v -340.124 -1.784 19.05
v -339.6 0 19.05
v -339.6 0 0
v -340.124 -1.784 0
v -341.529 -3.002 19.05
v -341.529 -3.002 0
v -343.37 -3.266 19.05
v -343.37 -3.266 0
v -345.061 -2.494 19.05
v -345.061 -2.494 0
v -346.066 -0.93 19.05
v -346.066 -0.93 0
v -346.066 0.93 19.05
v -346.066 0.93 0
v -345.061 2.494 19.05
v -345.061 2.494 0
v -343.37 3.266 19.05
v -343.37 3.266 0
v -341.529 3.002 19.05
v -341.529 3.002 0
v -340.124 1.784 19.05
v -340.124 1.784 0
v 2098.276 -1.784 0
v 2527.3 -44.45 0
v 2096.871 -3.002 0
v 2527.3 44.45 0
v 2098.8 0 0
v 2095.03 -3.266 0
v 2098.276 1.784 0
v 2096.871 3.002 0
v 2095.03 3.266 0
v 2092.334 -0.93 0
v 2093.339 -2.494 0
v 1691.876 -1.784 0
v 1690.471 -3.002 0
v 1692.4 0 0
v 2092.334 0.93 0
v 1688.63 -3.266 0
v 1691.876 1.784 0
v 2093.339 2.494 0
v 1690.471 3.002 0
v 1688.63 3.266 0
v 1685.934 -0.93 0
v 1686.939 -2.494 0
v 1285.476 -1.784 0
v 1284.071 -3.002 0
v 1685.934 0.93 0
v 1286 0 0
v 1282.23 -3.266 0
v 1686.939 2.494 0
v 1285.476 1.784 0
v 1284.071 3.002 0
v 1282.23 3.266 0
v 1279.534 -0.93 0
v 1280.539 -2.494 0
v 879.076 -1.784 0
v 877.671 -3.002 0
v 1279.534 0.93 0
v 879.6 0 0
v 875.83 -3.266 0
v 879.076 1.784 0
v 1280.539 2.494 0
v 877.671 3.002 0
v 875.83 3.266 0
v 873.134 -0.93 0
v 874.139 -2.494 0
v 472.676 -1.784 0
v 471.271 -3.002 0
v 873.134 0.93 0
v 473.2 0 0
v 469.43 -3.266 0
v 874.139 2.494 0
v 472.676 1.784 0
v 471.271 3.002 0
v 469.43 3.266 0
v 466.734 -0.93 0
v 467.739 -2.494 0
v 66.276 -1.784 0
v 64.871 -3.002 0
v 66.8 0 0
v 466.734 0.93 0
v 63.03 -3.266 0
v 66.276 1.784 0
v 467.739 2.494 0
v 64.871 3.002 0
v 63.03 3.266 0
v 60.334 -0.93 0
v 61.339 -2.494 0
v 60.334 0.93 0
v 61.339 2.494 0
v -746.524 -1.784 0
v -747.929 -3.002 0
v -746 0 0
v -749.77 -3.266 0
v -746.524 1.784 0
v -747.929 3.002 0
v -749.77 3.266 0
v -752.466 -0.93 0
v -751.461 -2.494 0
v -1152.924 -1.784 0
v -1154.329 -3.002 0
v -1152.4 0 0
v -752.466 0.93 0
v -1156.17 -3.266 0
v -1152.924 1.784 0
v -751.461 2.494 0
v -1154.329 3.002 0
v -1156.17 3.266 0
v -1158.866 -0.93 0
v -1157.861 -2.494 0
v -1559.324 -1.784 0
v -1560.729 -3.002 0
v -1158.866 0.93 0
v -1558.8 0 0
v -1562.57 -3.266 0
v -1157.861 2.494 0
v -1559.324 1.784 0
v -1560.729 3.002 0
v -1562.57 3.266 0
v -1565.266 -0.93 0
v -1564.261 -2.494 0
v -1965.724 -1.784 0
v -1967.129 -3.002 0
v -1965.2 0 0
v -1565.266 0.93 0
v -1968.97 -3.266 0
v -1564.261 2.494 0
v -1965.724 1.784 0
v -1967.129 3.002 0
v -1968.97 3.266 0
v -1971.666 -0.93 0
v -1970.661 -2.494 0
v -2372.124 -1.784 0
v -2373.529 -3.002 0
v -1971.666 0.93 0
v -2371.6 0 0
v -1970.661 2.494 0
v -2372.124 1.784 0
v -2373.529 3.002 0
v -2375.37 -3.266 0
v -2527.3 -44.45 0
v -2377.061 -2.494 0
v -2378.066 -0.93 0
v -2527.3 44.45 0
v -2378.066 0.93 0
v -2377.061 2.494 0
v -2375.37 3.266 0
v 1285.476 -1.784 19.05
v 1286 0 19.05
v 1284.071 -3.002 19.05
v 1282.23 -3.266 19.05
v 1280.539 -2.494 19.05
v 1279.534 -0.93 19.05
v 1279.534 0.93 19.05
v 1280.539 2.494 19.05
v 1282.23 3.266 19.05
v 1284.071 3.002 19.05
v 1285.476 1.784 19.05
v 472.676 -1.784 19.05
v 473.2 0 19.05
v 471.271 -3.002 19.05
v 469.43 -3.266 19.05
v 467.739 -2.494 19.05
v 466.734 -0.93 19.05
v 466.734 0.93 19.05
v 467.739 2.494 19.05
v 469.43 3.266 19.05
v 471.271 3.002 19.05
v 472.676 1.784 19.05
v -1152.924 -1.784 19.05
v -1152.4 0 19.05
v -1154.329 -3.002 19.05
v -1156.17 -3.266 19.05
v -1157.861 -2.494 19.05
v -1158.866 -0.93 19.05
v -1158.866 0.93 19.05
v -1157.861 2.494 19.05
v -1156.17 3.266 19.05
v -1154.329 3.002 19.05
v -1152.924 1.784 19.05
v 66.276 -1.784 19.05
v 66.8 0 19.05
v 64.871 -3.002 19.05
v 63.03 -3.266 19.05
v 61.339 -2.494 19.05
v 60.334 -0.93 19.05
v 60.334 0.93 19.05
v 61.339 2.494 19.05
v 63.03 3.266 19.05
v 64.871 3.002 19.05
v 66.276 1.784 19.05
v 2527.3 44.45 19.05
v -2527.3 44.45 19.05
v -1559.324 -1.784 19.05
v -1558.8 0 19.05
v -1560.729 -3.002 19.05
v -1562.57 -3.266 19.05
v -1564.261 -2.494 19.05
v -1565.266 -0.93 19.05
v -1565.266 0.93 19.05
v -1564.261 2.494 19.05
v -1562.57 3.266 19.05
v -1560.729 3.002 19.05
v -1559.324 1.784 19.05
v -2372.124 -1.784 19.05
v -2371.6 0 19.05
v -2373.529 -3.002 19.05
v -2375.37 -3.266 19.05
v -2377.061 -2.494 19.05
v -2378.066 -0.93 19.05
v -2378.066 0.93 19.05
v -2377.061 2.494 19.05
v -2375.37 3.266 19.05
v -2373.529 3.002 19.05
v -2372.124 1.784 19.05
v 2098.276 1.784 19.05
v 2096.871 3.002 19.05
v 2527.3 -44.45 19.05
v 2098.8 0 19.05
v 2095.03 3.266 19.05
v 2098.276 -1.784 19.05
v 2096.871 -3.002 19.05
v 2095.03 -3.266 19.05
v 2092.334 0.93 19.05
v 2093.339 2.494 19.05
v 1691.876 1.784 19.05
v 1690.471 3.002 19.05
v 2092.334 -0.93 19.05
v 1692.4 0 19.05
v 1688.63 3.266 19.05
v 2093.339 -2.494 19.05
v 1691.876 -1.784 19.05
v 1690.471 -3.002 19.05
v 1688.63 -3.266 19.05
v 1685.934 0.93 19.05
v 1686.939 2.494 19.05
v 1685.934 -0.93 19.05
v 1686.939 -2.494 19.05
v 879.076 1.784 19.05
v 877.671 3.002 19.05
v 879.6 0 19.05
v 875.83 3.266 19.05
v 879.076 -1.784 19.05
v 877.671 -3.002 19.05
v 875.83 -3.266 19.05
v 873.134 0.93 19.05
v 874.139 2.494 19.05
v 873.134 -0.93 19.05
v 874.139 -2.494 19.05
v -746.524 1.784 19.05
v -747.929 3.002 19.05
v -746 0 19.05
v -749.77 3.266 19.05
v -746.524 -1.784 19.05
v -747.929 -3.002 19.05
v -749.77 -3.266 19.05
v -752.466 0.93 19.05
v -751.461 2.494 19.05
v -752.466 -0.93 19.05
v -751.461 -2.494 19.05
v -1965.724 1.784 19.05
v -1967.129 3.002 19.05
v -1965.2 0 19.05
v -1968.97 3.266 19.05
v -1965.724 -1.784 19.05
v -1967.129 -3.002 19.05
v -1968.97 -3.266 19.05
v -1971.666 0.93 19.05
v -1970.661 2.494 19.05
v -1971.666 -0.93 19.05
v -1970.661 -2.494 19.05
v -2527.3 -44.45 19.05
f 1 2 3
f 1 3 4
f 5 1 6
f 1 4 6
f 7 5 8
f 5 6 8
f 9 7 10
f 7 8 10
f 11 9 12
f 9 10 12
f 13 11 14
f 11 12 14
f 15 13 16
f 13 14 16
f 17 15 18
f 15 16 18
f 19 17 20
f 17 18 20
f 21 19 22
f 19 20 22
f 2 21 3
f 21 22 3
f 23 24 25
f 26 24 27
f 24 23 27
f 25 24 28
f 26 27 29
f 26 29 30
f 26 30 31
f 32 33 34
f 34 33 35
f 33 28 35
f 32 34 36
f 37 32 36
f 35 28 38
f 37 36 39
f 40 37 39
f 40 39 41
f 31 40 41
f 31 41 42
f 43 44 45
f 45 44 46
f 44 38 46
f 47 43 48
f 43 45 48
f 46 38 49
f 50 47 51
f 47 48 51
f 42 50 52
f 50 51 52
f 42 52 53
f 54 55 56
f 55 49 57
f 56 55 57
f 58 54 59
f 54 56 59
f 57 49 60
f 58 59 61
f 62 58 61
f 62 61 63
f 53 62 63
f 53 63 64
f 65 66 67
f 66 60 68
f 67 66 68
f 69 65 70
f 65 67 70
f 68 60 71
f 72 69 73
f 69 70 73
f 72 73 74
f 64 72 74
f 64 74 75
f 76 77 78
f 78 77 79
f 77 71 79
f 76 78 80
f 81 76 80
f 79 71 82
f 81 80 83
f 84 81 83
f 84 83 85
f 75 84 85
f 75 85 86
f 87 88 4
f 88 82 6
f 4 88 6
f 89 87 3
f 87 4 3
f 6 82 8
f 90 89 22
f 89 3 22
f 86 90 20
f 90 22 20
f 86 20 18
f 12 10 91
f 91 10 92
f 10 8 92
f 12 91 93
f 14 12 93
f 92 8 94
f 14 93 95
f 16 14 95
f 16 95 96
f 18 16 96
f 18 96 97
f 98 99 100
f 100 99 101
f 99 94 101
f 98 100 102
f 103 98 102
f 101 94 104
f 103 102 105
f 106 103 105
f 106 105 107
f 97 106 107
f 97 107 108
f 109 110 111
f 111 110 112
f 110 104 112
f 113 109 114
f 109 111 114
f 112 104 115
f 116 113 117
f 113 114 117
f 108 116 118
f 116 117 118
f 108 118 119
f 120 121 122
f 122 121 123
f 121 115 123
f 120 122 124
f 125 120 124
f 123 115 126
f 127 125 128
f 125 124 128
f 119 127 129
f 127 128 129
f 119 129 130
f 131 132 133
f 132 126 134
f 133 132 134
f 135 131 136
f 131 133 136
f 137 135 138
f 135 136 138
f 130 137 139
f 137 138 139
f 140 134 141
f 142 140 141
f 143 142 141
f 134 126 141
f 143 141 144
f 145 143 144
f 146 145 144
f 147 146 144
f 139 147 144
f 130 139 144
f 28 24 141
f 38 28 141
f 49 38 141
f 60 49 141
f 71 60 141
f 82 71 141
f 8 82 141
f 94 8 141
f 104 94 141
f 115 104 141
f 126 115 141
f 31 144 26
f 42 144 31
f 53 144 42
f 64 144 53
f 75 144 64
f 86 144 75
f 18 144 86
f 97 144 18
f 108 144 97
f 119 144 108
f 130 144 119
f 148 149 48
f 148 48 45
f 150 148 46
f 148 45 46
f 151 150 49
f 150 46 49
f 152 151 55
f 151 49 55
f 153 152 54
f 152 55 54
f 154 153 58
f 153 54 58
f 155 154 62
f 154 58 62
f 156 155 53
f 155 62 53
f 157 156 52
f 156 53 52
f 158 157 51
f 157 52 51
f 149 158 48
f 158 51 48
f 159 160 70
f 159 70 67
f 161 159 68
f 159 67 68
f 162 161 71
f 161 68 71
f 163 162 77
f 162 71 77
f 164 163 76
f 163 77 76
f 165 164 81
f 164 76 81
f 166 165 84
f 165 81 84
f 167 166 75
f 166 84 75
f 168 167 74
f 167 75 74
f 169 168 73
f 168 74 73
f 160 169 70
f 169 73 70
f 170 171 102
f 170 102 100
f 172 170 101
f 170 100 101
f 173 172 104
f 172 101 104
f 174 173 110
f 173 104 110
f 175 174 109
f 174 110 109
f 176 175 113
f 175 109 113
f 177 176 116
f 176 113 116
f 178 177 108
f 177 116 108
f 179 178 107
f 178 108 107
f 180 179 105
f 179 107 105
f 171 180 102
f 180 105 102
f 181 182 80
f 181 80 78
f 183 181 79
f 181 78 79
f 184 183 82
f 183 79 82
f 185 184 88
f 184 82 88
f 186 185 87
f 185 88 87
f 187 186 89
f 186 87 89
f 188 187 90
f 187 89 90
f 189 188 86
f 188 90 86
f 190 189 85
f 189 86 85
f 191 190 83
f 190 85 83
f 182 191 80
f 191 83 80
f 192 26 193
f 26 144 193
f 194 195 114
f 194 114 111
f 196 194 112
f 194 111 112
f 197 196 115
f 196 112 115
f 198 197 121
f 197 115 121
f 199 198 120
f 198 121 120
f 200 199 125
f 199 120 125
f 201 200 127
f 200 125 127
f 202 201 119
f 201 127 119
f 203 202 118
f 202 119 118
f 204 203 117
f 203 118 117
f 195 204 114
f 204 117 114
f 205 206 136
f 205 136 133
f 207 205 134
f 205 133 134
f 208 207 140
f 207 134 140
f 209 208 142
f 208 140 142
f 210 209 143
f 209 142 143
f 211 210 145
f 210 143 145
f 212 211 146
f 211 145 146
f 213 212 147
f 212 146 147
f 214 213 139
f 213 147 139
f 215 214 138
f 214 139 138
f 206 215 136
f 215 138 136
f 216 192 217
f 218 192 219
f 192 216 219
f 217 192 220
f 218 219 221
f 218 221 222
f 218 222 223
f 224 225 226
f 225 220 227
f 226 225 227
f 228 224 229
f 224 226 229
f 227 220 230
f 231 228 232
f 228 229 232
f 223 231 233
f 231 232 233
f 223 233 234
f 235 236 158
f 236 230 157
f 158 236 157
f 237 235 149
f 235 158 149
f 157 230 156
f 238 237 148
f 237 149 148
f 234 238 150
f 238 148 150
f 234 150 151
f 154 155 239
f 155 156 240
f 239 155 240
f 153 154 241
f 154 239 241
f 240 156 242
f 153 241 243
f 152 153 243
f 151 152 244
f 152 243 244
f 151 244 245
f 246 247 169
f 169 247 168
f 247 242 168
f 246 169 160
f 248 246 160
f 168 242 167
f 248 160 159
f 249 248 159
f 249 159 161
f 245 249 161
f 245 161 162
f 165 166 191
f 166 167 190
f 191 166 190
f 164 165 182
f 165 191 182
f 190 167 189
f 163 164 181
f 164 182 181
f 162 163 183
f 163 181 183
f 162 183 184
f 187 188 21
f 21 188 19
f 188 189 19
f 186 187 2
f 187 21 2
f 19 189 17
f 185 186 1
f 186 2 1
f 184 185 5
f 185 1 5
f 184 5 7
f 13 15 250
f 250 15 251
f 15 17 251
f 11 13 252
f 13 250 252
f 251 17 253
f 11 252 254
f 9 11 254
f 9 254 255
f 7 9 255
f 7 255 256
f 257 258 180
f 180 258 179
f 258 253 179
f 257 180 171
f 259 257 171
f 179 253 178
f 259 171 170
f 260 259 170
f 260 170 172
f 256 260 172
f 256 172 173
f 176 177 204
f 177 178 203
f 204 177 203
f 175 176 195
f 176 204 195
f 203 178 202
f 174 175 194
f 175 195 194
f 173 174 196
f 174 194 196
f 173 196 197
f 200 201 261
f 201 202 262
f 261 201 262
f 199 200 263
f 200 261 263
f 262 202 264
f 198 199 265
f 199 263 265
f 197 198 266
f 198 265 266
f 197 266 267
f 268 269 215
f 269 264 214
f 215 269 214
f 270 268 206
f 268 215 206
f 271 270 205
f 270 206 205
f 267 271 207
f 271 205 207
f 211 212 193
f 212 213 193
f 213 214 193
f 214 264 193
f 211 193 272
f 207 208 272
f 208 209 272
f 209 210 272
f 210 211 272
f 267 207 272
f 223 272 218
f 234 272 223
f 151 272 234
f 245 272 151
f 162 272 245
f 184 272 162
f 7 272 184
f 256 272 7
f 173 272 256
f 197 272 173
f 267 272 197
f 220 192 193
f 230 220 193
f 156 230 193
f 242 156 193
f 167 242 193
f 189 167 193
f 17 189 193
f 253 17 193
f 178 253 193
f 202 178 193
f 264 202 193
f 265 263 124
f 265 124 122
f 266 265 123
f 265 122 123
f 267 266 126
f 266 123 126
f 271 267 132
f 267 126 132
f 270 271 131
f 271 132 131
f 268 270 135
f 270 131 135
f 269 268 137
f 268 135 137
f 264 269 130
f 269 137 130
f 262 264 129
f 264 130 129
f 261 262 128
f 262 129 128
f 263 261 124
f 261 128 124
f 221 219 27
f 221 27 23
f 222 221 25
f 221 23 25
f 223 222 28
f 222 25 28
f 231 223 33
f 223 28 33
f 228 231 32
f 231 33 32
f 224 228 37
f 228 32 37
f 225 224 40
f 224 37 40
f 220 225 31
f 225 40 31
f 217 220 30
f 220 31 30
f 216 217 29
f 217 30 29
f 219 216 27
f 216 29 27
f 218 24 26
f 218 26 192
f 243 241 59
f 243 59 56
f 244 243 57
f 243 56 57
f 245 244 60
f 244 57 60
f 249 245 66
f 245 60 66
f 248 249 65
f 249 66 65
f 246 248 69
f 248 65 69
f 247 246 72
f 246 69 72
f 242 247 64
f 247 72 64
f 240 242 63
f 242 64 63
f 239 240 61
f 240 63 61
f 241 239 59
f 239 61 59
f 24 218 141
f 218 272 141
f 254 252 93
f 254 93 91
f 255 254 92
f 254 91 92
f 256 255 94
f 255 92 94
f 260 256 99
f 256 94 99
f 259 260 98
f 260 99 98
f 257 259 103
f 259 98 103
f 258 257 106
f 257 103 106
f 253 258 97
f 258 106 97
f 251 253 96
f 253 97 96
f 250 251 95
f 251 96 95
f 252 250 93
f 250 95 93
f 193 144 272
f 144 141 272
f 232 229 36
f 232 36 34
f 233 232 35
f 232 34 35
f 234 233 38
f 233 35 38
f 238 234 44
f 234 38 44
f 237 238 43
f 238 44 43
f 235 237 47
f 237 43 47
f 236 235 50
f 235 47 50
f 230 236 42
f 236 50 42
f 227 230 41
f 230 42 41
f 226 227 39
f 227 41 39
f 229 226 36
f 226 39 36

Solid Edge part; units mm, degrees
sketch "Sketch1" plane through (0, 0, 0) normal (1, 0, 0) x (0, 1, 0)
  line L0 (-44.45, 0) -> (44.45, 0)
  line L1 (44.45, 0) -> (44.45, 19.05)
  line L2 (44.45, 19.05) -> (-44.45, 19.05)
  line L3 (-44.45, 19.05) -> (-44.45, 0)
  dimension "D1" = 88.9
  dimension "D2" = 19.05
extrude "Protrusion1" add sketch "Sketch1" along normal mid plane 5054.6
sketch "Sketch2" plane through (0, 0, 0) normal (0, 0, -1) x (1, 0, 0)
  circle A0 centre (-2374.9, 0) radius 3.3
  dimension "D1" = 6.6
  dimension "D2" = 152.4
extrude "Cutout1" cut sketch "Sketch2" against normal through all
pattern_linear "Pattern1" count 12 spacing 406.4 along (1, 0, 0) of "Cutout1"
